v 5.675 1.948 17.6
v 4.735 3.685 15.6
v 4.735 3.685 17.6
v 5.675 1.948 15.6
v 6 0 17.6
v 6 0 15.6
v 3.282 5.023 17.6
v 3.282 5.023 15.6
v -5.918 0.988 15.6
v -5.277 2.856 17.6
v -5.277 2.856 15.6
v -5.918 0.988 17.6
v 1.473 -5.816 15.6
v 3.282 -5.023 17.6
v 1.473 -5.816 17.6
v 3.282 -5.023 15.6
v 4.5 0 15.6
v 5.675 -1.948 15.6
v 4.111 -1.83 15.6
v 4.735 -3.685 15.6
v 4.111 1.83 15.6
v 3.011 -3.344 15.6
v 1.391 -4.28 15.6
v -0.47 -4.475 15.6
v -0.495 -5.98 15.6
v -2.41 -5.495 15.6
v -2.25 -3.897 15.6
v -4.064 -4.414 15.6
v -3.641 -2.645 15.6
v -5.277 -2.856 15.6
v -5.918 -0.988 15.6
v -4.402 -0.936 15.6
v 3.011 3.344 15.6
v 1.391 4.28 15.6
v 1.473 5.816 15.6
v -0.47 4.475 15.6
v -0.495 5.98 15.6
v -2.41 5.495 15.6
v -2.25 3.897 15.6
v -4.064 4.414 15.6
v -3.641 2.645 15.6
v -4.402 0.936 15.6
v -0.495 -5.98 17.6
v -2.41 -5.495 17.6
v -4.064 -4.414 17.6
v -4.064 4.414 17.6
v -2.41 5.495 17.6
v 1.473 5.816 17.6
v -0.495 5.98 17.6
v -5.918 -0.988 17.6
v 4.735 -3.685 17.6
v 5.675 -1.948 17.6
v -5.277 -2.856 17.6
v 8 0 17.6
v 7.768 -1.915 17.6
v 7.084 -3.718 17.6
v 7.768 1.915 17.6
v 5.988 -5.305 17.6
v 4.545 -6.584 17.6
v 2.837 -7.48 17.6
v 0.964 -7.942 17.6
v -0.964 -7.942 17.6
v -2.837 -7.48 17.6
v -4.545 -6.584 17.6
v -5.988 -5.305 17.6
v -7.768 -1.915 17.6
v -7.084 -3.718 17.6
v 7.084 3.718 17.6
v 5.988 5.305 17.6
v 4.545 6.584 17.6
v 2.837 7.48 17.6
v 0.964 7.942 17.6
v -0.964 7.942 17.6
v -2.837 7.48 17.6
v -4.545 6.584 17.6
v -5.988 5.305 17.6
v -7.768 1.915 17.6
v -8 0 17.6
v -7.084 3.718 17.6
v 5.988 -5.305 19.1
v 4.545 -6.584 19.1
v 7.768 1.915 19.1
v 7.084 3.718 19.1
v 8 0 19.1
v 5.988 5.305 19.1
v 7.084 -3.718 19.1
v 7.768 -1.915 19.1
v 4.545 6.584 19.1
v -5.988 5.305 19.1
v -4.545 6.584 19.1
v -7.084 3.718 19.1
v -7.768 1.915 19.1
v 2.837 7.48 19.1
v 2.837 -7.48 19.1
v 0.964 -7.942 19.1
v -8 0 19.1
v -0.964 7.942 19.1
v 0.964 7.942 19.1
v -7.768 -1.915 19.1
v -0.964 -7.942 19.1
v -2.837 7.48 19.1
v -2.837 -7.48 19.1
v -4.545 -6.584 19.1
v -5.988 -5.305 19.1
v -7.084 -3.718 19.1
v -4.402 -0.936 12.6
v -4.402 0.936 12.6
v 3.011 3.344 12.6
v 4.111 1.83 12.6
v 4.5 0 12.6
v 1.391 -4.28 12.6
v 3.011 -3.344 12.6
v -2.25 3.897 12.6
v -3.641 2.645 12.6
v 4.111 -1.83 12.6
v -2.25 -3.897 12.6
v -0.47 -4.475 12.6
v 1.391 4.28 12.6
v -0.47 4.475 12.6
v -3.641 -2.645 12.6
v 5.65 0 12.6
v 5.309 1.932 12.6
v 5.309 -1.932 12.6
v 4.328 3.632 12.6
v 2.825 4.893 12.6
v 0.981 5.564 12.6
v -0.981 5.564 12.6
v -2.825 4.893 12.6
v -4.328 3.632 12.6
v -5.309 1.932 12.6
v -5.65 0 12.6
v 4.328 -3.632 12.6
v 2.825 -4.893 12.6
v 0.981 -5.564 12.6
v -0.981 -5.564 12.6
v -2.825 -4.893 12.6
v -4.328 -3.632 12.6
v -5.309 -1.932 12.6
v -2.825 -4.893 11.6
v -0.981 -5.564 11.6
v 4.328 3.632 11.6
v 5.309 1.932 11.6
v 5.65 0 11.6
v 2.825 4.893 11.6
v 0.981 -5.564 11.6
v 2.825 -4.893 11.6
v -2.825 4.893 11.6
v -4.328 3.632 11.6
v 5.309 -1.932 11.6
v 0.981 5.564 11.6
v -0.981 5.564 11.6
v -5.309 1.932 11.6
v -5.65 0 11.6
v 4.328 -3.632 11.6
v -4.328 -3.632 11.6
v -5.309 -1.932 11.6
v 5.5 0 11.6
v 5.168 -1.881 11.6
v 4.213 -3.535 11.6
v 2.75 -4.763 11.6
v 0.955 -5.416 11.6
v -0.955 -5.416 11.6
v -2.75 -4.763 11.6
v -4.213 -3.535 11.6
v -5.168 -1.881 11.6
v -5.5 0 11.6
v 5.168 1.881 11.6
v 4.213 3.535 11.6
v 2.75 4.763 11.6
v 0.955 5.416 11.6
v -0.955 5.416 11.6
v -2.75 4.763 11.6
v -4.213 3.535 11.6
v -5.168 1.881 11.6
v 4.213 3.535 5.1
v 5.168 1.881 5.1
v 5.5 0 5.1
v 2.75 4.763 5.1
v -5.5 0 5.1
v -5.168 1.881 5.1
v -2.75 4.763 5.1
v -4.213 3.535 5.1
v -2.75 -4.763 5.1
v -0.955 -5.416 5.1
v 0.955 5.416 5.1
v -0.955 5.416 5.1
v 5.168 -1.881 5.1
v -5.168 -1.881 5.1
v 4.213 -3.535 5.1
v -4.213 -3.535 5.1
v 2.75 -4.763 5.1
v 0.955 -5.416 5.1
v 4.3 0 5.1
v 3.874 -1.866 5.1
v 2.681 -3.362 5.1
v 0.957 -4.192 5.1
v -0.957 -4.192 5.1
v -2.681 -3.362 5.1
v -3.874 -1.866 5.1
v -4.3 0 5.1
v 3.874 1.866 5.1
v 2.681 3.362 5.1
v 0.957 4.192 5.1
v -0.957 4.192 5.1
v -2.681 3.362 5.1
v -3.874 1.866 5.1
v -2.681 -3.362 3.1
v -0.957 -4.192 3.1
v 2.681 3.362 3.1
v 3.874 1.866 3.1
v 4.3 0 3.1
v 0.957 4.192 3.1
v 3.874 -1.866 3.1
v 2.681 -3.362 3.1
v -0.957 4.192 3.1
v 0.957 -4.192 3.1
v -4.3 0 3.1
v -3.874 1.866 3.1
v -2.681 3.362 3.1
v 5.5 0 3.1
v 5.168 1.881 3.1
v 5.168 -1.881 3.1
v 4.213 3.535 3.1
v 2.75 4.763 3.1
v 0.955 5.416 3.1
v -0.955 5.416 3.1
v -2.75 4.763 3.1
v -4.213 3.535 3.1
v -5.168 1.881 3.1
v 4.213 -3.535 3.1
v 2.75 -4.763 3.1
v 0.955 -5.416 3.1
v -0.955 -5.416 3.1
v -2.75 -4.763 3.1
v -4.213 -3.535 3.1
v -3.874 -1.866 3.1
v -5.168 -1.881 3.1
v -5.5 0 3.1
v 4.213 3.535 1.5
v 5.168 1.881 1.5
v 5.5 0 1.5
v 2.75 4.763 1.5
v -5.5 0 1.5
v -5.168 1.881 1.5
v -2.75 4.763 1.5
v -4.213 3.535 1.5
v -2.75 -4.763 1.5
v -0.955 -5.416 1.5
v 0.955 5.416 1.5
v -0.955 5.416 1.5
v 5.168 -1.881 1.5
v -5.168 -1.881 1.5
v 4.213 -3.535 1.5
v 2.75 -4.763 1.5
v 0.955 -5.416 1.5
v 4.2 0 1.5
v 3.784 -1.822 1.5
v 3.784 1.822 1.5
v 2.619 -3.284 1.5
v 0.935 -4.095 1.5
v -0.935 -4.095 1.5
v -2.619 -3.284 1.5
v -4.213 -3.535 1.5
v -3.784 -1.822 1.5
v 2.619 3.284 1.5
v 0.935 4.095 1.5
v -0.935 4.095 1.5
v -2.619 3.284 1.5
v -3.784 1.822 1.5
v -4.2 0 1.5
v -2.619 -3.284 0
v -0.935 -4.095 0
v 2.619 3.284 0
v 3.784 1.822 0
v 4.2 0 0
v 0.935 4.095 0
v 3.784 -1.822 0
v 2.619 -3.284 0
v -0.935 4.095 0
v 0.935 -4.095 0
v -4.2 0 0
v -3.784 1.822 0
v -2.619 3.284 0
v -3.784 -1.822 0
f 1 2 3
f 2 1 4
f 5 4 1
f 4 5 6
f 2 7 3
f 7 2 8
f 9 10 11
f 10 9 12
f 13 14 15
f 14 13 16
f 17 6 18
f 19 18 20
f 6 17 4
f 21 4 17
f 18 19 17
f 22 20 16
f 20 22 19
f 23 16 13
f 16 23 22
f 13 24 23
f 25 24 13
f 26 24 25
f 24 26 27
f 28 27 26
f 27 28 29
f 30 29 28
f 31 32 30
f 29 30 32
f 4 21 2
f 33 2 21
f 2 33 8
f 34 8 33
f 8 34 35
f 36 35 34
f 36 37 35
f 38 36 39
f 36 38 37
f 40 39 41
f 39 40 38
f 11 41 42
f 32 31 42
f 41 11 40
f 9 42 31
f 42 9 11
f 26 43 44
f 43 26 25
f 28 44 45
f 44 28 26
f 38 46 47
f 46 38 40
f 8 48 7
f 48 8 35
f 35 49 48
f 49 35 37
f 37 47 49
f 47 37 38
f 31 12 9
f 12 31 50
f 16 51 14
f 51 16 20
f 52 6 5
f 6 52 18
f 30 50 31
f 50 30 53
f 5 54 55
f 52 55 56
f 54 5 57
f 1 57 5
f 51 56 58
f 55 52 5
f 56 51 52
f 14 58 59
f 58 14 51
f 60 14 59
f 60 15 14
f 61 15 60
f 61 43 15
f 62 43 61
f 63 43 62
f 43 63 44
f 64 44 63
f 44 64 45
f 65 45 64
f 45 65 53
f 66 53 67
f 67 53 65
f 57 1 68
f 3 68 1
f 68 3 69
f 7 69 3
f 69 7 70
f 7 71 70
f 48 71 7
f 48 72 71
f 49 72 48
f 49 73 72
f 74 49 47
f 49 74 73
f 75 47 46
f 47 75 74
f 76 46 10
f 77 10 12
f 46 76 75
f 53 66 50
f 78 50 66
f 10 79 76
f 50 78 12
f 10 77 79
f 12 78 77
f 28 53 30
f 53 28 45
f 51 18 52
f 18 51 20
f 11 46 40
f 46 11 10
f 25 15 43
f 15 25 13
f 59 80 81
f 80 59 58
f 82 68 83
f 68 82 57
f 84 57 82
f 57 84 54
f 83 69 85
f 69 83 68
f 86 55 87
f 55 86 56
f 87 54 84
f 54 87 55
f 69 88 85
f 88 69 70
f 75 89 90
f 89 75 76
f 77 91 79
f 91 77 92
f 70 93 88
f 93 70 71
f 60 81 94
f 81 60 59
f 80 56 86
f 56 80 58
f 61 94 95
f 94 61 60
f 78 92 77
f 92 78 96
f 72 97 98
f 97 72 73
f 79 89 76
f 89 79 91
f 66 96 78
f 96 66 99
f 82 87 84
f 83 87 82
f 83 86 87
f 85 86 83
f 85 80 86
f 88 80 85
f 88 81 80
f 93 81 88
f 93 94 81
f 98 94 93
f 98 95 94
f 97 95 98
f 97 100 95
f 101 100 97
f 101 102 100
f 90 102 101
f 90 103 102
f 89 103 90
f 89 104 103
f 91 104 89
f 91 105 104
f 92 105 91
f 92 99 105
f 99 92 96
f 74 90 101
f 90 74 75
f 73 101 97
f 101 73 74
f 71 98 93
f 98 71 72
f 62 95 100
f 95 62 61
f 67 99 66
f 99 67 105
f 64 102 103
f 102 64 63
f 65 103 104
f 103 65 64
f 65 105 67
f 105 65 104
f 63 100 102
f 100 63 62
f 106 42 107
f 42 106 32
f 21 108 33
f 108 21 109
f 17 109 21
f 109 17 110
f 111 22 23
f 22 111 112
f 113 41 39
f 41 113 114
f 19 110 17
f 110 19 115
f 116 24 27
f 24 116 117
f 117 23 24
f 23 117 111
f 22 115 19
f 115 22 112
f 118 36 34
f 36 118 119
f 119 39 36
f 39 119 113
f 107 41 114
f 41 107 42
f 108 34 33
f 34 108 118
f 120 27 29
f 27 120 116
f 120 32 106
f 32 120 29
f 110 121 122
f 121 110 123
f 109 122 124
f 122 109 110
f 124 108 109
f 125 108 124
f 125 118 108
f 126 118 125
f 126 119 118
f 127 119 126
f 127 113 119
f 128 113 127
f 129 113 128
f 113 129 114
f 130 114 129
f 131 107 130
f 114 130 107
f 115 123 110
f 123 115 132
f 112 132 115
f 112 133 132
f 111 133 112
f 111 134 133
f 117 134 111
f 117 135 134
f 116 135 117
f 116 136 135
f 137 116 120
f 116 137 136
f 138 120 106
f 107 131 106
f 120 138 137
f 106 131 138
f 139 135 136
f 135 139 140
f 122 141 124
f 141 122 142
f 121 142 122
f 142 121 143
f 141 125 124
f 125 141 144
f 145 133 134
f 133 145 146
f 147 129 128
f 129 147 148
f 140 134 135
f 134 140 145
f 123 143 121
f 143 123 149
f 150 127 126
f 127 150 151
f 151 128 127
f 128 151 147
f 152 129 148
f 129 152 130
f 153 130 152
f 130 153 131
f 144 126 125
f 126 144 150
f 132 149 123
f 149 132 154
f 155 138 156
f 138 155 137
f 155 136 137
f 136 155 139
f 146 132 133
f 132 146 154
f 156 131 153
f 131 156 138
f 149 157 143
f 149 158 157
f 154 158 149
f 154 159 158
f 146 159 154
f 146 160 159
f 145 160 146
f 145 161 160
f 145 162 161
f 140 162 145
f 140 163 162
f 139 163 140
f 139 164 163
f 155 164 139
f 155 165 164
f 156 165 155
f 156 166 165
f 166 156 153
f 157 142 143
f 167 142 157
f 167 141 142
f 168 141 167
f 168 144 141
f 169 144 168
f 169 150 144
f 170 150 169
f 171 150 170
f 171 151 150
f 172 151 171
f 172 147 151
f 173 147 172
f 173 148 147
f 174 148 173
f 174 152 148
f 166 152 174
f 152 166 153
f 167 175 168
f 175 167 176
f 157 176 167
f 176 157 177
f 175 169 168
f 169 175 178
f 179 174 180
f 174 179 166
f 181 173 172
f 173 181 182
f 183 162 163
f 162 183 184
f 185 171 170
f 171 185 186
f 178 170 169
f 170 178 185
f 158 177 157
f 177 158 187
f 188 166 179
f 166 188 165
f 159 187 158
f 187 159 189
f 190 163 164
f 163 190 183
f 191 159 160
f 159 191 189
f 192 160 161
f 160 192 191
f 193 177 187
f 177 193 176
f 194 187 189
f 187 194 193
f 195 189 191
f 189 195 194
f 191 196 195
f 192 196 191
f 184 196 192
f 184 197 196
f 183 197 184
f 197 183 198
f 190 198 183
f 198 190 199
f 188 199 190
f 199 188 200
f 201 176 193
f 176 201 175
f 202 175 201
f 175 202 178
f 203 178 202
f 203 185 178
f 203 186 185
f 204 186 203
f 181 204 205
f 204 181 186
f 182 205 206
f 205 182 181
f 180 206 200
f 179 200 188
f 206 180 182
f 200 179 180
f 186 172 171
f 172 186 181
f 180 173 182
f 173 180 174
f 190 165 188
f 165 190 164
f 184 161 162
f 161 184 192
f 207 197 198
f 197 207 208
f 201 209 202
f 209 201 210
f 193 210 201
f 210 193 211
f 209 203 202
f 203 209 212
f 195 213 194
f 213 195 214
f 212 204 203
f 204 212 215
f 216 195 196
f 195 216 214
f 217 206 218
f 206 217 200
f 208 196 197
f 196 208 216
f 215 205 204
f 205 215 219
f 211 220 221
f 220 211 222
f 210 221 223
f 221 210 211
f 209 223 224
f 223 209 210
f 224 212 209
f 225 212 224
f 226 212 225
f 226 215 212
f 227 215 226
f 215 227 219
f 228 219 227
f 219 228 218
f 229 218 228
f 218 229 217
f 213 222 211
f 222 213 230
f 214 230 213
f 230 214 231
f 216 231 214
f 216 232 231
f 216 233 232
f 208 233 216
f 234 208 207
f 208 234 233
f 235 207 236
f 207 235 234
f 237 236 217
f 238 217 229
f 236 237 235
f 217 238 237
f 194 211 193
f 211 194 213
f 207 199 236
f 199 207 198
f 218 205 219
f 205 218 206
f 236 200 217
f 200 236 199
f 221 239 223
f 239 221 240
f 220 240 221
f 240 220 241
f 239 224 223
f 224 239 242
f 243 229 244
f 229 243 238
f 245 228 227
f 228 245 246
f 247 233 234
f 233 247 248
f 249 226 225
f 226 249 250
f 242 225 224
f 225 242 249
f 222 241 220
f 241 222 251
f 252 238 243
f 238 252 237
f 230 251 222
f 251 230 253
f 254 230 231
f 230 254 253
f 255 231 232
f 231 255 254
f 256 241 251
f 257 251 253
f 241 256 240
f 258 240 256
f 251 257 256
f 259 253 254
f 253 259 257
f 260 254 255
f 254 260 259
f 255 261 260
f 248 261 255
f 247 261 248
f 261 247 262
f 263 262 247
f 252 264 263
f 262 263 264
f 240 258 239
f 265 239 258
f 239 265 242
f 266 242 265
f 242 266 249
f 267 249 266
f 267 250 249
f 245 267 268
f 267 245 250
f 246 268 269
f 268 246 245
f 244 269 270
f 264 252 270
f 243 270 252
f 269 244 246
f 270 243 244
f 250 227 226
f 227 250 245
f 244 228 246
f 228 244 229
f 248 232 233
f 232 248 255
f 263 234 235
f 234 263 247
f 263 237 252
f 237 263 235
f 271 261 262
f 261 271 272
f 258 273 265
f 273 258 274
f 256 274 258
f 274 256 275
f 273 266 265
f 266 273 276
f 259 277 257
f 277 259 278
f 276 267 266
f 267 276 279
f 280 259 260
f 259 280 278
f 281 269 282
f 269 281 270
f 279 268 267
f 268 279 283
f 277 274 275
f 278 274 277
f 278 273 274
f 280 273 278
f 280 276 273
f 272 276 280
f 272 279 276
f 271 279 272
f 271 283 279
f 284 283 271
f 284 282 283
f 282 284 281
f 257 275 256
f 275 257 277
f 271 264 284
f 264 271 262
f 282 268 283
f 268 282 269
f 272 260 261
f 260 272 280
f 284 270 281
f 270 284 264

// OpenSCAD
// source hydration connector

hd = [[1.5, 8.4], [1.6, 11], [2, 8.6], [6.5, 11], [1, 11.3], [3, 9], [2,  12], [1.5, 16]];

module cylinder_series(dimensions, index = 0, offset = 0) {
    hx = dimensions[index];
    translate([0, 0, offset]) cylinder(h=hx[0], d=hx[1]);
    new_offset = offset + hx[0];
    new_index = index + 1;
    if (dimensions[new_index] != undef)
        cylinder_series(dimensions, new_index, new_offset);
}

cylinder_series(hd);
